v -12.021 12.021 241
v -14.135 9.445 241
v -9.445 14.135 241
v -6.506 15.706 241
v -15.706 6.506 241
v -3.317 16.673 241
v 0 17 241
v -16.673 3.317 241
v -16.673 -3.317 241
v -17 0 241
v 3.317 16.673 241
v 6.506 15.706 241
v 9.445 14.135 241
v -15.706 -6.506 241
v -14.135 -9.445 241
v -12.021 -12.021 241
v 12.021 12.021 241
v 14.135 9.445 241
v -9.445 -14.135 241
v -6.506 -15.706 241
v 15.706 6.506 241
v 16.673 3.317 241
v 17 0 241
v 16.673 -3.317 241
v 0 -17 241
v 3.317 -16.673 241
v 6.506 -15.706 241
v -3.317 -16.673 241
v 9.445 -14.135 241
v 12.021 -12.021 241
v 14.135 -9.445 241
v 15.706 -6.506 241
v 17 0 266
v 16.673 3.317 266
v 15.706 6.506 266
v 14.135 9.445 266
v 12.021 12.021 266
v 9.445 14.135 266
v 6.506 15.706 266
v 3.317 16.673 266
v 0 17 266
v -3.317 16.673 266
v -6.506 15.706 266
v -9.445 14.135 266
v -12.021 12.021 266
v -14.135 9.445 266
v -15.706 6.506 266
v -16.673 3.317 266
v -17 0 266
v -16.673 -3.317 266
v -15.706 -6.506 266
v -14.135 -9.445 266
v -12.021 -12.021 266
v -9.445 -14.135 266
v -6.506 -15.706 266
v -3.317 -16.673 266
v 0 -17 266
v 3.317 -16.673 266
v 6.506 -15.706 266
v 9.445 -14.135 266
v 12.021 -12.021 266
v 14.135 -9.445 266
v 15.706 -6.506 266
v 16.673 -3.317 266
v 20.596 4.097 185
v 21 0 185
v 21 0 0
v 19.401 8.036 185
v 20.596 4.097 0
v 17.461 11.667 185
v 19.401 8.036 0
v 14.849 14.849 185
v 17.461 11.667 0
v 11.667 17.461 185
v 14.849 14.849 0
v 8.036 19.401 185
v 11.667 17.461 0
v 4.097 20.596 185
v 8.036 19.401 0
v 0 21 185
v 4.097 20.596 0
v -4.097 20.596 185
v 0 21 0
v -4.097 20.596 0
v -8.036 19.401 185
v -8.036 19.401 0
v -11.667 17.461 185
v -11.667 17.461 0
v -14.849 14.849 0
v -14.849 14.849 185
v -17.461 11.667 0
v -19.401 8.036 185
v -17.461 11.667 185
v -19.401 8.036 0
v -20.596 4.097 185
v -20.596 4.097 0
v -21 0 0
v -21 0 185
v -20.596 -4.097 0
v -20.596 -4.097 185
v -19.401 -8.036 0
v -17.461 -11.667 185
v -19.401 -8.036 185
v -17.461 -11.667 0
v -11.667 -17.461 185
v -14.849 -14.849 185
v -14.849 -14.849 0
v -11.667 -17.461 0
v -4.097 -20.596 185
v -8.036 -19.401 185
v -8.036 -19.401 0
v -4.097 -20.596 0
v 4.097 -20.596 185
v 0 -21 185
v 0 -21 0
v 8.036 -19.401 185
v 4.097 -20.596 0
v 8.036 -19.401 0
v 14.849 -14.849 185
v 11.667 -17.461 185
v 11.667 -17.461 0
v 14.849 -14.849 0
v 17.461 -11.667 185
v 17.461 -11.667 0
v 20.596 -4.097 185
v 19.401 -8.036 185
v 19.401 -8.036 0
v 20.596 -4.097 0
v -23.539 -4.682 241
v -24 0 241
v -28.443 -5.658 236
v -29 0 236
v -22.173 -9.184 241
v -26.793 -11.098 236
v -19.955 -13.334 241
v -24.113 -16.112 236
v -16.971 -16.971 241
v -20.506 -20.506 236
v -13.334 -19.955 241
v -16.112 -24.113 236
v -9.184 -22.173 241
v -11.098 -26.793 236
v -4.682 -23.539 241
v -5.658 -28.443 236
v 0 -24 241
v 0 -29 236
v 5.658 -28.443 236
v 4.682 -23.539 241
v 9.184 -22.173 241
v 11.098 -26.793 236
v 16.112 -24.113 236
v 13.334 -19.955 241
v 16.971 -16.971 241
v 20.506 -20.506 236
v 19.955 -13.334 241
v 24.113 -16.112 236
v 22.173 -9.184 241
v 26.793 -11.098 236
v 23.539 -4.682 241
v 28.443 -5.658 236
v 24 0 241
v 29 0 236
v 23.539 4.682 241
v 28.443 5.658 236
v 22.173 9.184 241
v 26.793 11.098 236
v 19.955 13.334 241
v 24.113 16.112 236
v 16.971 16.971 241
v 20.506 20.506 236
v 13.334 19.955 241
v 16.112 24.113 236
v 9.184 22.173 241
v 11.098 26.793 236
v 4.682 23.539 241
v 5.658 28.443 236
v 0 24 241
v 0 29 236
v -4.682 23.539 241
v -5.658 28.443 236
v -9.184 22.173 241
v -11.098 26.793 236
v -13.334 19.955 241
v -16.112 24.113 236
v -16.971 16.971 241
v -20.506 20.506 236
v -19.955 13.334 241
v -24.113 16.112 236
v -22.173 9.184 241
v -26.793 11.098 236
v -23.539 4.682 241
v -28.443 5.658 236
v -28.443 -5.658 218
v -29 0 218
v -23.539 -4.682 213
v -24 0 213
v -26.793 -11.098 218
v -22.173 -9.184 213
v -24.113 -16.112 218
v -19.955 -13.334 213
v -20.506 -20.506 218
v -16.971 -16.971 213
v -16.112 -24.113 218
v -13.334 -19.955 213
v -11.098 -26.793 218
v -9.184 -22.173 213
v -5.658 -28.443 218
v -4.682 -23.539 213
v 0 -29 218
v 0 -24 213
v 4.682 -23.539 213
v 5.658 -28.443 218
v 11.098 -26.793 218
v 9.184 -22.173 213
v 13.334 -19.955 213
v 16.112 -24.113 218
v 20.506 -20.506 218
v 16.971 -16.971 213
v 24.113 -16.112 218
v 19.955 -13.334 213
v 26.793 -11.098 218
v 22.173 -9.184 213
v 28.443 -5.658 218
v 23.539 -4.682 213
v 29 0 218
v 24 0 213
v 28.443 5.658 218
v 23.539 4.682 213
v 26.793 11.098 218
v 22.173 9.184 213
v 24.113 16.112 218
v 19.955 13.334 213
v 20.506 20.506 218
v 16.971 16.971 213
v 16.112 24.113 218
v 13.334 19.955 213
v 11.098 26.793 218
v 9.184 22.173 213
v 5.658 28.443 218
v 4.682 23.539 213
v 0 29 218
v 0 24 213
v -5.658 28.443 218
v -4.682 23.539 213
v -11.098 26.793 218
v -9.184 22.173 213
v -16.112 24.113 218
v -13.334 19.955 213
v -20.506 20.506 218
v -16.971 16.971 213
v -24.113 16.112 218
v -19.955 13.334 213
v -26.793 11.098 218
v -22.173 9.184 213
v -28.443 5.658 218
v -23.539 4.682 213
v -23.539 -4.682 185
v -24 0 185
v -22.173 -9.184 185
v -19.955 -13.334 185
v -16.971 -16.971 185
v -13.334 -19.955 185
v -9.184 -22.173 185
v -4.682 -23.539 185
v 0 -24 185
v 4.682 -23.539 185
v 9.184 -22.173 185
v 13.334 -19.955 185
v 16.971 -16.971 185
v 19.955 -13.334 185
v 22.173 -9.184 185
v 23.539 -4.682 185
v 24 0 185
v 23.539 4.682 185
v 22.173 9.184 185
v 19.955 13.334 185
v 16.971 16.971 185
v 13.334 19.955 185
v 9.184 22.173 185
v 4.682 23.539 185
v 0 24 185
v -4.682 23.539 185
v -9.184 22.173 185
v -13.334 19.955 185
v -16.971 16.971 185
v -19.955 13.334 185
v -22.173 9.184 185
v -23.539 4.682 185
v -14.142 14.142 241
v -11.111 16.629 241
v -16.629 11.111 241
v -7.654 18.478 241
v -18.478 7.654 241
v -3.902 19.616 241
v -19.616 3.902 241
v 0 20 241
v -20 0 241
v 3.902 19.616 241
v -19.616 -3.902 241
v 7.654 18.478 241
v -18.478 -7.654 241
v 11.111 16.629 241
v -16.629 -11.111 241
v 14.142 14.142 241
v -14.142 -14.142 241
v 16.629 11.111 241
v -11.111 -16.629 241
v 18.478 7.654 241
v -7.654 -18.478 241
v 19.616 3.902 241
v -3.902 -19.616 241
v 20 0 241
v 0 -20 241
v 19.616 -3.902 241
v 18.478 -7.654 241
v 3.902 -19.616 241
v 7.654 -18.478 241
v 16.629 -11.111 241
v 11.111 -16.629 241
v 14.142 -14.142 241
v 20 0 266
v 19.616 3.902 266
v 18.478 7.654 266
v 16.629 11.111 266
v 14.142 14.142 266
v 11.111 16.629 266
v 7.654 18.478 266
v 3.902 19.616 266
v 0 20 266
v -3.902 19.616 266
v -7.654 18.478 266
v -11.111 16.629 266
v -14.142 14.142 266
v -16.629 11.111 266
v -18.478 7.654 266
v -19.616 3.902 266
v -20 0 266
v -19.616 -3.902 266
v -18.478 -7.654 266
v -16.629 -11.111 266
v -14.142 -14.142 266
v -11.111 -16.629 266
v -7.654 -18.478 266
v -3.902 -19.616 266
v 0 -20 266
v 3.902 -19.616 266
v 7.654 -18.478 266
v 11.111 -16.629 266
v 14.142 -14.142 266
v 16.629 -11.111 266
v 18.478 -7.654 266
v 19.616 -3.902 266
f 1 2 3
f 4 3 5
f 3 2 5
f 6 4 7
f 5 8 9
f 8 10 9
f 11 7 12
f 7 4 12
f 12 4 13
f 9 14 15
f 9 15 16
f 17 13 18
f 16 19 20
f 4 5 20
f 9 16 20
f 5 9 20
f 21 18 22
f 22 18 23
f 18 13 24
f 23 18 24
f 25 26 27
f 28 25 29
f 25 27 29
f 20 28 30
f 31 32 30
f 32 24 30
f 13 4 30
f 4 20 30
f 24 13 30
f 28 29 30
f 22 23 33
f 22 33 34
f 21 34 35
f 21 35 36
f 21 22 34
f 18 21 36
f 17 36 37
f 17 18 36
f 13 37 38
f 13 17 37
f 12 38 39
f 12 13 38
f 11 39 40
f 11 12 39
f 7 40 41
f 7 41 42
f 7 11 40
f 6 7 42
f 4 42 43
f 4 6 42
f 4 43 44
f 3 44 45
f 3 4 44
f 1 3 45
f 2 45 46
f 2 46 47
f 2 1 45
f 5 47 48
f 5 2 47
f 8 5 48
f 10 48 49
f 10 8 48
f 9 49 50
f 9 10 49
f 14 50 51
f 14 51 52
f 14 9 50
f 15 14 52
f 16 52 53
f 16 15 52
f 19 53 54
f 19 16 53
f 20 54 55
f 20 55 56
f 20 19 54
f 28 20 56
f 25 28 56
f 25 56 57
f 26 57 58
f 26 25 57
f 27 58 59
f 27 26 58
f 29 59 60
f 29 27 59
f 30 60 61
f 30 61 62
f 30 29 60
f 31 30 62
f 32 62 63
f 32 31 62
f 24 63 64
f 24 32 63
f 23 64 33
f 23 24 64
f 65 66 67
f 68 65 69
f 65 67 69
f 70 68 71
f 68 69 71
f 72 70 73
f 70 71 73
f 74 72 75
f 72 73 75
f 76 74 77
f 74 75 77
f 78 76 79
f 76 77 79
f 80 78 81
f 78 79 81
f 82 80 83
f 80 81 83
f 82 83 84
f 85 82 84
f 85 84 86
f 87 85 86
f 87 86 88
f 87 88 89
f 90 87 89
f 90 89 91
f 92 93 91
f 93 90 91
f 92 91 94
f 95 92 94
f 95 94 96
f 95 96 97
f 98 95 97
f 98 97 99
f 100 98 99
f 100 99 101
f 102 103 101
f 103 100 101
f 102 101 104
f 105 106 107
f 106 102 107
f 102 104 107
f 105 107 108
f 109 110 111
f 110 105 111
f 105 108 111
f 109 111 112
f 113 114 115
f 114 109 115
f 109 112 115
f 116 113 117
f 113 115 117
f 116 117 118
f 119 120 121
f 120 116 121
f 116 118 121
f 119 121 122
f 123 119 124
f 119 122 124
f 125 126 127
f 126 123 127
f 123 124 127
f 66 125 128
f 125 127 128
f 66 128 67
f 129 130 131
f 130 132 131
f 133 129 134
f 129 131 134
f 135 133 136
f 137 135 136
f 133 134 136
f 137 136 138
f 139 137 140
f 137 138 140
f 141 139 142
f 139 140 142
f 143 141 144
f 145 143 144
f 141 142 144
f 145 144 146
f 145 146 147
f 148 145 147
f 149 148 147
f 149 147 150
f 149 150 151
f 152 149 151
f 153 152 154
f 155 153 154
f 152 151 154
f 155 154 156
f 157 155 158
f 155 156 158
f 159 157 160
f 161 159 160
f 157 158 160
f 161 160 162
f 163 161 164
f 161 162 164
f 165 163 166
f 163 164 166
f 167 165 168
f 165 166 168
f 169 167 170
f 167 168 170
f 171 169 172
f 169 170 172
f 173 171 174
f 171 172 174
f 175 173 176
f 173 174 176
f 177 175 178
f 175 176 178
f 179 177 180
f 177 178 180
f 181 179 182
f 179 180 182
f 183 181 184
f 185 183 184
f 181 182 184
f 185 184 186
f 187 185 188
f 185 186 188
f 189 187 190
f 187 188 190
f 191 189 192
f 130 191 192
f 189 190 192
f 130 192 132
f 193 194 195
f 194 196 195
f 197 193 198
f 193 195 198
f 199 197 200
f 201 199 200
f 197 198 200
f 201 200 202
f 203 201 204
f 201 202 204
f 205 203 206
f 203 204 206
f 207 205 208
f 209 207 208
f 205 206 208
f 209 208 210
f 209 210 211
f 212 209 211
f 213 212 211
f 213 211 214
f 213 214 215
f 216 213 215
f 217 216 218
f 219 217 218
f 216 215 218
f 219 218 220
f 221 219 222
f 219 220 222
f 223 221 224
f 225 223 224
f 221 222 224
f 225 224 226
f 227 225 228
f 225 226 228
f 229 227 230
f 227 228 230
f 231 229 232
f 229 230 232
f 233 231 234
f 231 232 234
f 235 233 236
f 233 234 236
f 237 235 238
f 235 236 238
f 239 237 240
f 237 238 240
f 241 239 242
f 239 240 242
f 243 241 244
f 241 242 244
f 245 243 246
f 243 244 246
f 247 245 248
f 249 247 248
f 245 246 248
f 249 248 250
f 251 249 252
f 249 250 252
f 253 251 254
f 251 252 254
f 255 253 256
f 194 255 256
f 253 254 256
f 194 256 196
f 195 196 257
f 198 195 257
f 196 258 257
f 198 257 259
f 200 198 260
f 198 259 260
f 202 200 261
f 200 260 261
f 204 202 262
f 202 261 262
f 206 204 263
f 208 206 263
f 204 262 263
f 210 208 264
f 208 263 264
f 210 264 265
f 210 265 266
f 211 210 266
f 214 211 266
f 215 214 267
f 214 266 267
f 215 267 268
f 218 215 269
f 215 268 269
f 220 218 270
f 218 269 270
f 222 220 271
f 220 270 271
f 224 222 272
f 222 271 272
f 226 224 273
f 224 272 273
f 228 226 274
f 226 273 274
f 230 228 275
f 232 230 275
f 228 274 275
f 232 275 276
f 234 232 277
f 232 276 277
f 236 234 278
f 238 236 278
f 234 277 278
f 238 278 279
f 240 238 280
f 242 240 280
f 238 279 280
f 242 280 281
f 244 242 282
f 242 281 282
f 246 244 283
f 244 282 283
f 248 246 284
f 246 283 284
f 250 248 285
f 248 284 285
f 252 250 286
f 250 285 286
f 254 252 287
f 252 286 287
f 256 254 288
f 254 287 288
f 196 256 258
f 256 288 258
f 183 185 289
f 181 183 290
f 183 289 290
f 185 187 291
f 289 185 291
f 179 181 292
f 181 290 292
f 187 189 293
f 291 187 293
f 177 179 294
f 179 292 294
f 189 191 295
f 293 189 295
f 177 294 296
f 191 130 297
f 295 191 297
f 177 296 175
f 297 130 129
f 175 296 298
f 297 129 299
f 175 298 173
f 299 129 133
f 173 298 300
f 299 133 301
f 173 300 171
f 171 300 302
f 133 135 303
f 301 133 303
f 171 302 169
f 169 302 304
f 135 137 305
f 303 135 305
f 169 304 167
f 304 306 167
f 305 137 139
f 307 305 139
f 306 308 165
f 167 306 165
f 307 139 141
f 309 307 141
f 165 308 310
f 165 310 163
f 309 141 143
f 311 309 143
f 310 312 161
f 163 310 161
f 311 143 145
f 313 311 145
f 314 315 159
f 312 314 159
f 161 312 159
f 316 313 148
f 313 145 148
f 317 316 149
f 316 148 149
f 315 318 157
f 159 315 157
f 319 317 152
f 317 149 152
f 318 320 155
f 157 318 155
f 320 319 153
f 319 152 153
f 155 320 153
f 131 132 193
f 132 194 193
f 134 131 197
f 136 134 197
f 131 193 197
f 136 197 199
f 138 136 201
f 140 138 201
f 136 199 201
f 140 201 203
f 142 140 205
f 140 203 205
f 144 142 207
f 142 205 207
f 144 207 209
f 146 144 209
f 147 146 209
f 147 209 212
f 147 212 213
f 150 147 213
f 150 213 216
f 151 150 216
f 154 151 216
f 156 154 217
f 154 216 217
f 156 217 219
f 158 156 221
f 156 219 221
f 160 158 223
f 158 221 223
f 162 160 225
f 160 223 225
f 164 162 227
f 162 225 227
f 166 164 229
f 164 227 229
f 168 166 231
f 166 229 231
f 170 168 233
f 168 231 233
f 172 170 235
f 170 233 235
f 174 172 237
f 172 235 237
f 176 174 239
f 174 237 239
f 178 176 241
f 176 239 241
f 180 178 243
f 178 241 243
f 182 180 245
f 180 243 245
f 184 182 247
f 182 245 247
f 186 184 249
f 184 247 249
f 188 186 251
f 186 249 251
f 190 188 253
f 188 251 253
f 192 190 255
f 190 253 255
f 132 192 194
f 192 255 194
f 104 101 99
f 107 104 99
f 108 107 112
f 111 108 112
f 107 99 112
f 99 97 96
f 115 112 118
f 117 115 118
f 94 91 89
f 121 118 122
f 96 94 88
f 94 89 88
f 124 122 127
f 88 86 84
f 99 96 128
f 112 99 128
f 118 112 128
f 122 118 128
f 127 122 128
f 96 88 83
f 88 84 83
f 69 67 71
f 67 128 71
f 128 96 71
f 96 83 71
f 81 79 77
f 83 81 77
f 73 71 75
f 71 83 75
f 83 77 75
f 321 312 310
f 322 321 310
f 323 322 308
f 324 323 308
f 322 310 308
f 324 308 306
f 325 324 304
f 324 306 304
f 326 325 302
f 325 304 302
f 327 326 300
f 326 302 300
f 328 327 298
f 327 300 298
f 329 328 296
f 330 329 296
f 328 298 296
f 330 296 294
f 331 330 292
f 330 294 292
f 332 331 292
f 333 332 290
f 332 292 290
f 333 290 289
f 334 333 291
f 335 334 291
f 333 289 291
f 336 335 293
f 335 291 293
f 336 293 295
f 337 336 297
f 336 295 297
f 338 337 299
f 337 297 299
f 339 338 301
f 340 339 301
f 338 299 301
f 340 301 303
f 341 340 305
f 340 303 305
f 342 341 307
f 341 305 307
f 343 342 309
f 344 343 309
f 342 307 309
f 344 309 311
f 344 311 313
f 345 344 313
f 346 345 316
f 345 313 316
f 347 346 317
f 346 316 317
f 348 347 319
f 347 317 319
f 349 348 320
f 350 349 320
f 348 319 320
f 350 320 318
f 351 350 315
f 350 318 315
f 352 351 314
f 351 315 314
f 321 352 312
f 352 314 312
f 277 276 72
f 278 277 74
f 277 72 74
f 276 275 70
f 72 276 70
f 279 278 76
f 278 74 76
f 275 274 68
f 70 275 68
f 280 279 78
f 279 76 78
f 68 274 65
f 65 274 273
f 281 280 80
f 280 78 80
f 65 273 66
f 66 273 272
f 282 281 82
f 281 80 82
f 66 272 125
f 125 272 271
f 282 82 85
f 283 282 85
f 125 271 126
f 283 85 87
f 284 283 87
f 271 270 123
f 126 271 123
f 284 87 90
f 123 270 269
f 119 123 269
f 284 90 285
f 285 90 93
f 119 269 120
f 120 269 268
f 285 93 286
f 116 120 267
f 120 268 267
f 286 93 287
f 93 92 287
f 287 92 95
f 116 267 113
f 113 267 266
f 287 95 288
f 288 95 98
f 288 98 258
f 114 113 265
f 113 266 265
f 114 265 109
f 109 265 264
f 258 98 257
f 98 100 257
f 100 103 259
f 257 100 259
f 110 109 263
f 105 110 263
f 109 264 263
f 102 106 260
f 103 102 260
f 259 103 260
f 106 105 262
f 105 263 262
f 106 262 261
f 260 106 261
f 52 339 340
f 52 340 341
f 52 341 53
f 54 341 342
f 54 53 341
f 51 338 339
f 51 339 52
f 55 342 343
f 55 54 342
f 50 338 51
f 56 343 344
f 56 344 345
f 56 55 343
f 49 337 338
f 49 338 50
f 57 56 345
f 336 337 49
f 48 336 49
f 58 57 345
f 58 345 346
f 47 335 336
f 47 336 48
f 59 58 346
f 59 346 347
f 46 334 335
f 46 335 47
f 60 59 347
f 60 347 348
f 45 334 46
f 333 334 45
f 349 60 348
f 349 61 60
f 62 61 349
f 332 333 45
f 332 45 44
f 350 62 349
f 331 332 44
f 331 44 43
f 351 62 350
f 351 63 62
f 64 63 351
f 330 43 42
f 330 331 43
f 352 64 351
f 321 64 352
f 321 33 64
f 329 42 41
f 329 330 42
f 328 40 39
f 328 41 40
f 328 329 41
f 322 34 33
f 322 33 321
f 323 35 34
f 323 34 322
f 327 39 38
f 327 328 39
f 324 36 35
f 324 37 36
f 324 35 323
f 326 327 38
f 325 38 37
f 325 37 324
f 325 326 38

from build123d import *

# Parameters (mm, degrees)
F0_R     = 21
F1_DEPTH = 200
F4_R     = 20
F4_R_2   = 17
F5_DEPTH = 25


with BuildPart() as f1:
    # F0 (on Top) → F1 (new body)
    with BuildSketch(Plane.XY):
        Circle(F0_R)
    extrude(amount=F1_DEPTH)

    # F2 (on Front) → F3 (revolve)
    with BuildSketch(Plane.XZ):
        Polygon((-24, 185), (0, 185), (0, 241), (-24, 241), (-29, 236), (-29, 218), (-24, 213), align=None)
    revolve(axis=Axis((0, 0, 74.559175), (0, 0, 1)))

    # F4 (on face) → F5 (join)
    with BuildSketch(Plane.XY.offset(241)):
        Circle(F4_R)
        Circle(F4_R_2, mode=Mode.SUBTRACT)
    extrude(amount=F5_DEPTH)


solid = f1.part
